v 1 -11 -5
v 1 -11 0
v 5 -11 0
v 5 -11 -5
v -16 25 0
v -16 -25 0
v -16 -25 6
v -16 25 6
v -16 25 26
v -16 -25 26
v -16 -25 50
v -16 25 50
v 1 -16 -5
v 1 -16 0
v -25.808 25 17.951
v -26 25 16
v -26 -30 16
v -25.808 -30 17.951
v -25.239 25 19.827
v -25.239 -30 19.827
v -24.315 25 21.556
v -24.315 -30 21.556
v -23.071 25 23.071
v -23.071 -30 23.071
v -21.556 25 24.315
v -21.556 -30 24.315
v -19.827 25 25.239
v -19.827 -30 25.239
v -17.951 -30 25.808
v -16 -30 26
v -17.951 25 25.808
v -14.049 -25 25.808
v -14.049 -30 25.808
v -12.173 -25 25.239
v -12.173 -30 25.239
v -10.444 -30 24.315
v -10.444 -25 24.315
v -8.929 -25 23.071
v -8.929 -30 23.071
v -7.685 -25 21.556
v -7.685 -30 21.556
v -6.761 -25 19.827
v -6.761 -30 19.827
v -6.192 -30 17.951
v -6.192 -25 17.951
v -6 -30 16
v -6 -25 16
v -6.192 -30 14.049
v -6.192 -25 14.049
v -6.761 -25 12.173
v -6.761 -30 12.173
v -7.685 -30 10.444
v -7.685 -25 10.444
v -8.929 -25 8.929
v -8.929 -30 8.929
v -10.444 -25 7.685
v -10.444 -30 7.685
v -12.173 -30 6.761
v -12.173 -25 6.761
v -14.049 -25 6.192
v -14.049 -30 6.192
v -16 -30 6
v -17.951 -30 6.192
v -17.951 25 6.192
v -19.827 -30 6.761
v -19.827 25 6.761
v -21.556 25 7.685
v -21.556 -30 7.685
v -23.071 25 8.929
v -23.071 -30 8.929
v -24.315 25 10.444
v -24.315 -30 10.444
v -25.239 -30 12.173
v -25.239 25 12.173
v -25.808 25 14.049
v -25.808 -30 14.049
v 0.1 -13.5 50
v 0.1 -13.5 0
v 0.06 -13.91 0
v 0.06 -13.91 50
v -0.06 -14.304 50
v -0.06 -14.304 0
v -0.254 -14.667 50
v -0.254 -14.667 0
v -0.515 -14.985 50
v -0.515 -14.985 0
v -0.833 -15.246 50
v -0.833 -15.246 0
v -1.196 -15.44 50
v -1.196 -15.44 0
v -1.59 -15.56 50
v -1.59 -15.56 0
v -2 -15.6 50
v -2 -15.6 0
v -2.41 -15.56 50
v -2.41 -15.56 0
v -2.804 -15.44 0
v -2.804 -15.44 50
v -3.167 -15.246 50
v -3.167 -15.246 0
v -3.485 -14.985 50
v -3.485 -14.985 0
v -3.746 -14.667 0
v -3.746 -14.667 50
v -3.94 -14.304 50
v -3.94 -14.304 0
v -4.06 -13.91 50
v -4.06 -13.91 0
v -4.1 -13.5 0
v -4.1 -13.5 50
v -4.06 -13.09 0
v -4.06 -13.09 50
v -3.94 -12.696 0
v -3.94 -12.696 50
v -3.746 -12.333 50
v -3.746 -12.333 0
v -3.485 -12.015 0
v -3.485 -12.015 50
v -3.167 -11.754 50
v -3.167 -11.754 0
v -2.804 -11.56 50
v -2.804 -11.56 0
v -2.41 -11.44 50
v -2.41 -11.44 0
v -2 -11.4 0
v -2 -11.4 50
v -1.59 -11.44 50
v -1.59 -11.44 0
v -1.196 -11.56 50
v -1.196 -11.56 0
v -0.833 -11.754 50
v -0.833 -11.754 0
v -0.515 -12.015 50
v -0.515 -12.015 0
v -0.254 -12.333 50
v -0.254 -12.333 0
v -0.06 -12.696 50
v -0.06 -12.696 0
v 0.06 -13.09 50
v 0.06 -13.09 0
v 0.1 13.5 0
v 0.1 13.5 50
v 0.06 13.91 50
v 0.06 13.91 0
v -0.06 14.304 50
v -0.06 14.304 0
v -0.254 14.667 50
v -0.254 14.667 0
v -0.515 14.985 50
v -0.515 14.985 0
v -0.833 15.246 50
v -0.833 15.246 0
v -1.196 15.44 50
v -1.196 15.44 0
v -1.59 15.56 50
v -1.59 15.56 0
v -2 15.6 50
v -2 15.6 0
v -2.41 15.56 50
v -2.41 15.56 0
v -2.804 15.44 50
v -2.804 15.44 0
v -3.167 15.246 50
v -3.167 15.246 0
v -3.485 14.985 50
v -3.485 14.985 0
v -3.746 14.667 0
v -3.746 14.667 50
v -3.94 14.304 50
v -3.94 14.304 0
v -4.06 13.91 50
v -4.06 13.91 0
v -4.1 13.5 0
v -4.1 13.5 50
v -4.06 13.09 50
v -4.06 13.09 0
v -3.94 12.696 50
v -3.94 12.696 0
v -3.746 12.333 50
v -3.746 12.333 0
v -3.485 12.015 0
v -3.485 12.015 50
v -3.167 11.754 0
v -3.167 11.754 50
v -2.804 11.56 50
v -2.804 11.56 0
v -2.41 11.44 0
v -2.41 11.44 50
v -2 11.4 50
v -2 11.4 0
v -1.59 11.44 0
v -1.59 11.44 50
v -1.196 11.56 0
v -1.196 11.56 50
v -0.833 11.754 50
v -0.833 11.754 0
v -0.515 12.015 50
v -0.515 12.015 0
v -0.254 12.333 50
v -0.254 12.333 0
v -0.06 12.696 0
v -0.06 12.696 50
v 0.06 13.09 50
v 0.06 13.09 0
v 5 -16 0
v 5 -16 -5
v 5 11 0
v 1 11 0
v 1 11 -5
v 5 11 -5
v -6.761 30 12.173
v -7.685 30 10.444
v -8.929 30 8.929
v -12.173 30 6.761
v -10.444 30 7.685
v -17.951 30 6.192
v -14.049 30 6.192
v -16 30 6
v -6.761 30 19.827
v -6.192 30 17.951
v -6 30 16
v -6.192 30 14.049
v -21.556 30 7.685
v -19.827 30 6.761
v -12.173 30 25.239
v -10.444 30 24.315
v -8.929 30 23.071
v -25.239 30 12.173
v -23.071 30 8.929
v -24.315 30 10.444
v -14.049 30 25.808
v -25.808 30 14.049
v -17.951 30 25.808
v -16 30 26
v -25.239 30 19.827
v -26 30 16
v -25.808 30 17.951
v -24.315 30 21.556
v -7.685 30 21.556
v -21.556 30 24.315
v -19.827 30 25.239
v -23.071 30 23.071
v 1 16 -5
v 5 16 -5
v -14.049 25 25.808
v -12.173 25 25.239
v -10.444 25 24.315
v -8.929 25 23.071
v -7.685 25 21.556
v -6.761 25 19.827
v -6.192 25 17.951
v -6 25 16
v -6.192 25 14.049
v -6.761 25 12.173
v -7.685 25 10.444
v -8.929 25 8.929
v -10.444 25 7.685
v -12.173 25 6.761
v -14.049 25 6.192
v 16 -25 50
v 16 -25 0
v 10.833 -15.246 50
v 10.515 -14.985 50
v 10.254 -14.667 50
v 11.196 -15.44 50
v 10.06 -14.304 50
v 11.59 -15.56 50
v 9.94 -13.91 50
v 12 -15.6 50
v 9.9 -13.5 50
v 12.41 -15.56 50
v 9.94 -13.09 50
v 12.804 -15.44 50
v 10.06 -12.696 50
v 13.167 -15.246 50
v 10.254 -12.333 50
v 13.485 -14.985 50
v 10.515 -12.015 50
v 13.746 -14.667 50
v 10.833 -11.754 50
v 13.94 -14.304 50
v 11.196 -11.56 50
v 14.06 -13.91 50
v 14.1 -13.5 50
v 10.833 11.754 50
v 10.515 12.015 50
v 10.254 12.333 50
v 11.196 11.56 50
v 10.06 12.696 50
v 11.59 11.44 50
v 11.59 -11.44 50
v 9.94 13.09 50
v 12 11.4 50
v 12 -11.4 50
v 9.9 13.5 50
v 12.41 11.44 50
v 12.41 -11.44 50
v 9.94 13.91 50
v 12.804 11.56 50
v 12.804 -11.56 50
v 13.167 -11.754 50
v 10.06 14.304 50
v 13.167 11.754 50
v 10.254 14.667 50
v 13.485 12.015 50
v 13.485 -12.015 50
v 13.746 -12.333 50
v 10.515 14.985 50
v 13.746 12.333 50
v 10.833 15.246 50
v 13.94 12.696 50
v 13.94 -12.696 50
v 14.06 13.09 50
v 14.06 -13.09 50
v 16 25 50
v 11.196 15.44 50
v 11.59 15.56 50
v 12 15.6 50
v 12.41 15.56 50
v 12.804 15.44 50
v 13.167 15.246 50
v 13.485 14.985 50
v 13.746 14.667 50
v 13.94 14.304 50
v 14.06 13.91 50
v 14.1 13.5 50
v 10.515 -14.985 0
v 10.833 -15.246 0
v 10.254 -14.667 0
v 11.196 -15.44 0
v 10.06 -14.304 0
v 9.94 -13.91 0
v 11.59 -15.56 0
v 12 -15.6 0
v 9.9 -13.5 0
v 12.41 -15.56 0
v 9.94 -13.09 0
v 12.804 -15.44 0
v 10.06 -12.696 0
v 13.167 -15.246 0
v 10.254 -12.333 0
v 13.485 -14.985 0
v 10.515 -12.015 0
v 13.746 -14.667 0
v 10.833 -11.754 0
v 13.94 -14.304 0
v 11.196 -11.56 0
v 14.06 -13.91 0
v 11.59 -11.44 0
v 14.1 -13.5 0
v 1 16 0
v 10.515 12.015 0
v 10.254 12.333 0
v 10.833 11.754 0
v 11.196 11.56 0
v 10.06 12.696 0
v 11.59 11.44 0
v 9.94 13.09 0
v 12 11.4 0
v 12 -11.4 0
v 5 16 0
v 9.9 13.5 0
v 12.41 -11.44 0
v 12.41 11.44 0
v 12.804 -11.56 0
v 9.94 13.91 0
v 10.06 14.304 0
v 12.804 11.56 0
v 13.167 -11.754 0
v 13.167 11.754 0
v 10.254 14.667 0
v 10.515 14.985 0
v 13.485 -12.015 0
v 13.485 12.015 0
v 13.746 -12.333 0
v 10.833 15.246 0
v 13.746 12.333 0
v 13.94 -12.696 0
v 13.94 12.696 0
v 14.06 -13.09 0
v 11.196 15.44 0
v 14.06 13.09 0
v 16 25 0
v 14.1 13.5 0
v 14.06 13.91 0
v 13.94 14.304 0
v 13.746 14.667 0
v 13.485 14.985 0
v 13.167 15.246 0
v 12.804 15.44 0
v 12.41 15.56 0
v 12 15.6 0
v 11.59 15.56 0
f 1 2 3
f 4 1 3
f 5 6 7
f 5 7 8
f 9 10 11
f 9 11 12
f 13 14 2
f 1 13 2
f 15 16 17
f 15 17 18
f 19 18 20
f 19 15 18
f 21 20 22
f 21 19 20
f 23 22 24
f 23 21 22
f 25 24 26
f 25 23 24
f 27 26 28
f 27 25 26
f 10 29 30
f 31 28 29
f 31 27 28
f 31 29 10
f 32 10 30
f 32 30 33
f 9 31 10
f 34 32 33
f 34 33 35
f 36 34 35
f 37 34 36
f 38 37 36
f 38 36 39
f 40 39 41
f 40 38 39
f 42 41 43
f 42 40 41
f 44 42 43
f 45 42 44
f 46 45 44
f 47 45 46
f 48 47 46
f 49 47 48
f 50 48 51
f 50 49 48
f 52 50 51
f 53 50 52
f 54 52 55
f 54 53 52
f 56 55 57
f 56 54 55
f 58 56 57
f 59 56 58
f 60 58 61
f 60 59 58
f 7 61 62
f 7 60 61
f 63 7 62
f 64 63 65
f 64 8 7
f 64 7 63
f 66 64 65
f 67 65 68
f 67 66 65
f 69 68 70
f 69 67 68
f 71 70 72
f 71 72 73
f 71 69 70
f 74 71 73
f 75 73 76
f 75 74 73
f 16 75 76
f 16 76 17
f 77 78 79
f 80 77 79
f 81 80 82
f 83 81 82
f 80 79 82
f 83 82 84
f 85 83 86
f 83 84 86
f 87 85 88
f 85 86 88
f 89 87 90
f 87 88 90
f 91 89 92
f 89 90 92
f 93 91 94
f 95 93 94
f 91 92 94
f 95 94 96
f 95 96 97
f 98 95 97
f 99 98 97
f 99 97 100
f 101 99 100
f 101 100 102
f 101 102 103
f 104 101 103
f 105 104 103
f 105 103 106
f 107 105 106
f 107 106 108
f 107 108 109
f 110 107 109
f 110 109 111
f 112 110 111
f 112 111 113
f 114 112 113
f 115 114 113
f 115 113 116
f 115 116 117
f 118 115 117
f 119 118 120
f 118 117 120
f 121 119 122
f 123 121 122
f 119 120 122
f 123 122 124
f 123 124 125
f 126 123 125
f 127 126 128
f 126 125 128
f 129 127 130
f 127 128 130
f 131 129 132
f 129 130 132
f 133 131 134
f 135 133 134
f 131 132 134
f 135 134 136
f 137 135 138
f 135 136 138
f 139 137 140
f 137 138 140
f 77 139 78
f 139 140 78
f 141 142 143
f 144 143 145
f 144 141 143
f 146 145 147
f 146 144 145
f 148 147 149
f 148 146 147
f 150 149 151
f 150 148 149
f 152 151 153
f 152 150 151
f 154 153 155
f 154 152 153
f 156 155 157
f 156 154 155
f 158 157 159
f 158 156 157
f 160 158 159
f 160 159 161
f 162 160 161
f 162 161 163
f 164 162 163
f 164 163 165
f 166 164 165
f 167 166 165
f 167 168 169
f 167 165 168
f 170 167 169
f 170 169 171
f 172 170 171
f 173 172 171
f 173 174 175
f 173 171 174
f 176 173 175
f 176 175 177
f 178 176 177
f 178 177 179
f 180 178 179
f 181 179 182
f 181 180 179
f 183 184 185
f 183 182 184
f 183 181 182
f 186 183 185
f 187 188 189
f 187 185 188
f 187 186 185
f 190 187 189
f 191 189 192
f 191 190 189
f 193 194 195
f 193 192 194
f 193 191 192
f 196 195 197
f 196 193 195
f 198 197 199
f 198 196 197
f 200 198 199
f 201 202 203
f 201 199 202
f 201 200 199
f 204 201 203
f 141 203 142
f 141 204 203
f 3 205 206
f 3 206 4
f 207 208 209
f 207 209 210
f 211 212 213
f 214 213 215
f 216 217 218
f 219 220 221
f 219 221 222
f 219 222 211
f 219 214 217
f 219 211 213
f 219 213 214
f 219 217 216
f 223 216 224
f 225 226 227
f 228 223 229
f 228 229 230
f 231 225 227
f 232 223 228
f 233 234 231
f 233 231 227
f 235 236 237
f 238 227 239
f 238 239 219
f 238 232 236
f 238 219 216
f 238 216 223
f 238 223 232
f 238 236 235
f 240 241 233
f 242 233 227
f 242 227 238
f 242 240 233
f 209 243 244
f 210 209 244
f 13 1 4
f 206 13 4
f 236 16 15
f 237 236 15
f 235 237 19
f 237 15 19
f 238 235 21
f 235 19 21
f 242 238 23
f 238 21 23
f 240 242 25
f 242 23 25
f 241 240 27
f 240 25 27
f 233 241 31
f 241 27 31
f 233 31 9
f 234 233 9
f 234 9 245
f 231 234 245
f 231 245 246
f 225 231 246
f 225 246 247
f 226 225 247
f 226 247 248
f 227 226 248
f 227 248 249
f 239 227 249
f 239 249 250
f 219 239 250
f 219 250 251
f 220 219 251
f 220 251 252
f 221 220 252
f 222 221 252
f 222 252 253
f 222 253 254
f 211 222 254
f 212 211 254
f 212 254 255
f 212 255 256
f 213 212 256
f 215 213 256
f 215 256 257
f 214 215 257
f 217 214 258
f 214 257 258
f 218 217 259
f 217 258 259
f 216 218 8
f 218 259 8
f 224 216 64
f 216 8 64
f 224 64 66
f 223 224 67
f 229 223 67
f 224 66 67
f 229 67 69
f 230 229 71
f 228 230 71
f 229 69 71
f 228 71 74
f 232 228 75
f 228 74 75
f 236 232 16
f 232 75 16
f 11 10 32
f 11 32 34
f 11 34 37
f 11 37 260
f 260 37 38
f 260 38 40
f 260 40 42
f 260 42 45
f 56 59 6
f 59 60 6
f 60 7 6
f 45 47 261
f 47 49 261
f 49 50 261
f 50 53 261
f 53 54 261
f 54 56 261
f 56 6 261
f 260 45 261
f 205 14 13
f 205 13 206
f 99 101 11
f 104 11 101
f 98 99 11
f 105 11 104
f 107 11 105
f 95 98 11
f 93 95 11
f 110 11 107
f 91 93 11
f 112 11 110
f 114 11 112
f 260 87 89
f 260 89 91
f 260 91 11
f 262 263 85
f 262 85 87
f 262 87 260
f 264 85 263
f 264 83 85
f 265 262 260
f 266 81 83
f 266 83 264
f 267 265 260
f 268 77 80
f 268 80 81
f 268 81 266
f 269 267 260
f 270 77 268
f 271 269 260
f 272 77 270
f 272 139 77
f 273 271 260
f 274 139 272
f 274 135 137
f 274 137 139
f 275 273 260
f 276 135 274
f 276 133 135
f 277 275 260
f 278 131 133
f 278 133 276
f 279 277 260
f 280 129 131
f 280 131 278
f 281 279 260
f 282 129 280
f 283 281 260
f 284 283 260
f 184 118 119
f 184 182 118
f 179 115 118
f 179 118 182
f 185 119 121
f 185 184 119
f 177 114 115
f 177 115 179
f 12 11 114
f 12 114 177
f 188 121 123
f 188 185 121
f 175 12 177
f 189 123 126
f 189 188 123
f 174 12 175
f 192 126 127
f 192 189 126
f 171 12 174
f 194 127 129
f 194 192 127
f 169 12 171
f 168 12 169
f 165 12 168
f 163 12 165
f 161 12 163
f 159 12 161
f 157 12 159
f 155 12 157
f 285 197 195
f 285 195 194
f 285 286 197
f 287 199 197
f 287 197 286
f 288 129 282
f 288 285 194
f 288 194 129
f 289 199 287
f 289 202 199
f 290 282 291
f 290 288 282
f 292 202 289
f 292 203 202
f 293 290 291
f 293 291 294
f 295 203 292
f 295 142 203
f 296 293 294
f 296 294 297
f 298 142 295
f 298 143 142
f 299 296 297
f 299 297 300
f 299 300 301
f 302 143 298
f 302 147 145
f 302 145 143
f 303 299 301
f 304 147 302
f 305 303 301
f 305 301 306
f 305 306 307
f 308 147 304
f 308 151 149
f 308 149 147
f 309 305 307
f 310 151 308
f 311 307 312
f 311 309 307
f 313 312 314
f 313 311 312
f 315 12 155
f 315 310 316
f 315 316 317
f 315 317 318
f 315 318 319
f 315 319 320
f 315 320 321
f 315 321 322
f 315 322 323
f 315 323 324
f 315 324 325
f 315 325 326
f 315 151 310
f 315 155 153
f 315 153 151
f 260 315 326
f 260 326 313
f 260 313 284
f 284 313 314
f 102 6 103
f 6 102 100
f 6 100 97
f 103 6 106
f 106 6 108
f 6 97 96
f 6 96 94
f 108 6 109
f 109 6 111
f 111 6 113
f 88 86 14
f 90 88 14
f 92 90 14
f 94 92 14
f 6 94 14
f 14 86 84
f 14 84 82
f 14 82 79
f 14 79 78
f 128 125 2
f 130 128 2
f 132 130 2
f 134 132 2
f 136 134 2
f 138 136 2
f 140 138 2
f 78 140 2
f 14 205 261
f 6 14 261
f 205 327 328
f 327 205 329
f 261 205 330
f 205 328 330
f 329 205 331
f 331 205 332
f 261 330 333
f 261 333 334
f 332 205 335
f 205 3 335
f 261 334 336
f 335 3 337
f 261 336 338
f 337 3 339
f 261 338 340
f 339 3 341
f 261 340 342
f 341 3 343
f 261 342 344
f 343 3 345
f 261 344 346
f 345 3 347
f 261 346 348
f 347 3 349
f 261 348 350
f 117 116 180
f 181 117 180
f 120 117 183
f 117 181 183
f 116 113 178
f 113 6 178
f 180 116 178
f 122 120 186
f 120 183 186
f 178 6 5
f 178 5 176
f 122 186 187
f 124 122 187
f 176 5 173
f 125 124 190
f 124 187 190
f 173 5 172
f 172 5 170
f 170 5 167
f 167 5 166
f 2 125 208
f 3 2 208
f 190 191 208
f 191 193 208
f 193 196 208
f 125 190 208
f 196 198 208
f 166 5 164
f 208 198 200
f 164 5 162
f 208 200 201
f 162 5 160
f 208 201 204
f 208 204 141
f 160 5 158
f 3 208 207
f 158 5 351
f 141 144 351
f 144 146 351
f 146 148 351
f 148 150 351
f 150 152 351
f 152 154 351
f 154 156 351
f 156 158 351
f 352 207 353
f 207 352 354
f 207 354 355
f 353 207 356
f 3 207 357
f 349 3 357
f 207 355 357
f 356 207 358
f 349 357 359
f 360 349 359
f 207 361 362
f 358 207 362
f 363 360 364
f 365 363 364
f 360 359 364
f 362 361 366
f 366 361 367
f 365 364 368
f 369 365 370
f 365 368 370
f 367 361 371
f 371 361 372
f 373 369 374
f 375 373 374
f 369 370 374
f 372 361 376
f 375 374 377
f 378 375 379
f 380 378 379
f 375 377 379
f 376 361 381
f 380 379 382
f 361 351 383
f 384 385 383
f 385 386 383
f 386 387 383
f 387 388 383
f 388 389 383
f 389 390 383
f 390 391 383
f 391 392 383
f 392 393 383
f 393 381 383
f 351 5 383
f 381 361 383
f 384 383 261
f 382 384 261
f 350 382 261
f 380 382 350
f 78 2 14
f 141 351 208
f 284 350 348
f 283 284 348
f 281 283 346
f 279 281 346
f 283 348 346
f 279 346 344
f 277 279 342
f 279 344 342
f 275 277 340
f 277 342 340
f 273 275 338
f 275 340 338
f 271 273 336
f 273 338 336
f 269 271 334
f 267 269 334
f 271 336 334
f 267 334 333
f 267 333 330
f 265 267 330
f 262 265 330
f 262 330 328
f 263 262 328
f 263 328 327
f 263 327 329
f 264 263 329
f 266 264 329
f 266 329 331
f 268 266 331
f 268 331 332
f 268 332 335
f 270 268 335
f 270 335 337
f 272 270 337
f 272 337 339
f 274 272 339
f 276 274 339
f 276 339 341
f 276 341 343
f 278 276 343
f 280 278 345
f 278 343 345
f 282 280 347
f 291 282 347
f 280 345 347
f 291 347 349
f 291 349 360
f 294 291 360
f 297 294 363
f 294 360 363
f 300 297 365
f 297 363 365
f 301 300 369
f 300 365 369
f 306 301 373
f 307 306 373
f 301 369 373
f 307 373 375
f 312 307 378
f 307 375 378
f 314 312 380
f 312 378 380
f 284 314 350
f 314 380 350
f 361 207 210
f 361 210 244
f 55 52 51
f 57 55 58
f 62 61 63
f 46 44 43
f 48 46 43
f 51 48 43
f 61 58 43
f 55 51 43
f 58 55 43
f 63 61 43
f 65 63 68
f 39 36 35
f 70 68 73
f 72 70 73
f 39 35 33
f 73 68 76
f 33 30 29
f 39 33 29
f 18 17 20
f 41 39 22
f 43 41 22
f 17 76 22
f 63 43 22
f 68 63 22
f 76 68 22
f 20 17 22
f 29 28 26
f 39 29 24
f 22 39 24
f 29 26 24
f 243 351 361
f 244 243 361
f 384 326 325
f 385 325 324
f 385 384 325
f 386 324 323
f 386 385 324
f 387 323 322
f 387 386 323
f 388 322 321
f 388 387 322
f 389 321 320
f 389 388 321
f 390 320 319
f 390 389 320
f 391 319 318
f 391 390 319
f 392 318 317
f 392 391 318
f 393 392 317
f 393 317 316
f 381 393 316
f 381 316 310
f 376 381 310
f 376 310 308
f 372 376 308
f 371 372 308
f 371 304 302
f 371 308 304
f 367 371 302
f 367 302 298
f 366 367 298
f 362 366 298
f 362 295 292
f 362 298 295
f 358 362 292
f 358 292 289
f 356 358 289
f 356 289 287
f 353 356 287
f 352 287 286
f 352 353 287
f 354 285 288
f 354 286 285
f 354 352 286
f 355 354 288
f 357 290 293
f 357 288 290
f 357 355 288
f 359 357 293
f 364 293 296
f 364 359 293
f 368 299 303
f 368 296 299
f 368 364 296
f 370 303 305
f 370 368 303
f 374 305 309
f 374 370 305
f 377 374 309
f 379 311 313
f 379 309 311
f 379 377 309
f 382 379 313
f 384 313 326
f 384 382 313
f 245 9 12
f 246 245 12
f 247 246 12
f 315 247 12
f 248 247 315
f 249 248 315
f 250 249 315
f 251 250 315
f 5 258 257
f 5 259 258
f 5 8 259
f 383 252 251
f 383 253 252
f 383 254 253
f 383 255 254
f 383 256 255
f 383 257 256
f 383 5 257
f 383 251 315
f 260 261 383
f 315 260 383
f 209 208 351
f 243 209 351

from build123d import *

# Parameters (mm, degrees)
SKETCH001_W       = 32
SKETCH001_H       = 50
PAD_DEPTH         = 50
SKETCH002_W       = 4
SKETCH002_H       = 5
PAD001_DEPTH      = 5
SKETCH003_R       = 2.1
POCKET_DEPTH      = 211.852784
SKETCH004_R       = 10
PAD002_DEPTH      = 5
PAD002_DEPTH_BACK = 55


with BuildPart() as part:
    # Sketch001 → Pad (new body)
    with BuildSketch(Plane.XY):
        Rectangle(SKETCH001_W, SKETCH001_H)
    extrude(amount=PAD_DEPTH)

    # Sketch002 → Pad001 (join)
    with BuildSketch(Plane.XY):
        with Locations((3, 13.5)):
            Rectangle(SKETCH002_W, SKETCH002_H)
        with Locations((3, -13.5)):
            Rectangle(SKETCH002_W, SKETCH002_H)
    extrude(amount=-PAD001_DEPTH)

    # Sketch003 → Pocket (cut, through all)
    with BuildSketch(Plane.XY):
        with Locations((-2, 13.5)):
            Circle(SKETCH003_R)
        with Locations((12, 13.5)):
            Circle(SKETCH003_R)
    pocket = extrude(amount=POCKET_DEPTH, mode=Mode.SUBTRACT)

    # Mirrored: Pocket across Sketch003 H_Axis
    add(pocket.mirror(Plane.ZX), mode=Mode.SUBTRACT)

    # Sketch004 (on DatumPlane) → Pad002 (join, two sides)
    with BuildSketch(Plane(origin=(0, 25, 0), x_dir=(-1, 0, 0), z_dir=(0, 1, 0))) as pad002_sk:
        with Locations((16, 16)):
            Circle(SKETCH004_R)
    extrude(amount=PAD002_DEPTH)
    extrude(pad002_sk.sketch, amount=-PAD002_DEPTH_BACK)


solid = part.part
